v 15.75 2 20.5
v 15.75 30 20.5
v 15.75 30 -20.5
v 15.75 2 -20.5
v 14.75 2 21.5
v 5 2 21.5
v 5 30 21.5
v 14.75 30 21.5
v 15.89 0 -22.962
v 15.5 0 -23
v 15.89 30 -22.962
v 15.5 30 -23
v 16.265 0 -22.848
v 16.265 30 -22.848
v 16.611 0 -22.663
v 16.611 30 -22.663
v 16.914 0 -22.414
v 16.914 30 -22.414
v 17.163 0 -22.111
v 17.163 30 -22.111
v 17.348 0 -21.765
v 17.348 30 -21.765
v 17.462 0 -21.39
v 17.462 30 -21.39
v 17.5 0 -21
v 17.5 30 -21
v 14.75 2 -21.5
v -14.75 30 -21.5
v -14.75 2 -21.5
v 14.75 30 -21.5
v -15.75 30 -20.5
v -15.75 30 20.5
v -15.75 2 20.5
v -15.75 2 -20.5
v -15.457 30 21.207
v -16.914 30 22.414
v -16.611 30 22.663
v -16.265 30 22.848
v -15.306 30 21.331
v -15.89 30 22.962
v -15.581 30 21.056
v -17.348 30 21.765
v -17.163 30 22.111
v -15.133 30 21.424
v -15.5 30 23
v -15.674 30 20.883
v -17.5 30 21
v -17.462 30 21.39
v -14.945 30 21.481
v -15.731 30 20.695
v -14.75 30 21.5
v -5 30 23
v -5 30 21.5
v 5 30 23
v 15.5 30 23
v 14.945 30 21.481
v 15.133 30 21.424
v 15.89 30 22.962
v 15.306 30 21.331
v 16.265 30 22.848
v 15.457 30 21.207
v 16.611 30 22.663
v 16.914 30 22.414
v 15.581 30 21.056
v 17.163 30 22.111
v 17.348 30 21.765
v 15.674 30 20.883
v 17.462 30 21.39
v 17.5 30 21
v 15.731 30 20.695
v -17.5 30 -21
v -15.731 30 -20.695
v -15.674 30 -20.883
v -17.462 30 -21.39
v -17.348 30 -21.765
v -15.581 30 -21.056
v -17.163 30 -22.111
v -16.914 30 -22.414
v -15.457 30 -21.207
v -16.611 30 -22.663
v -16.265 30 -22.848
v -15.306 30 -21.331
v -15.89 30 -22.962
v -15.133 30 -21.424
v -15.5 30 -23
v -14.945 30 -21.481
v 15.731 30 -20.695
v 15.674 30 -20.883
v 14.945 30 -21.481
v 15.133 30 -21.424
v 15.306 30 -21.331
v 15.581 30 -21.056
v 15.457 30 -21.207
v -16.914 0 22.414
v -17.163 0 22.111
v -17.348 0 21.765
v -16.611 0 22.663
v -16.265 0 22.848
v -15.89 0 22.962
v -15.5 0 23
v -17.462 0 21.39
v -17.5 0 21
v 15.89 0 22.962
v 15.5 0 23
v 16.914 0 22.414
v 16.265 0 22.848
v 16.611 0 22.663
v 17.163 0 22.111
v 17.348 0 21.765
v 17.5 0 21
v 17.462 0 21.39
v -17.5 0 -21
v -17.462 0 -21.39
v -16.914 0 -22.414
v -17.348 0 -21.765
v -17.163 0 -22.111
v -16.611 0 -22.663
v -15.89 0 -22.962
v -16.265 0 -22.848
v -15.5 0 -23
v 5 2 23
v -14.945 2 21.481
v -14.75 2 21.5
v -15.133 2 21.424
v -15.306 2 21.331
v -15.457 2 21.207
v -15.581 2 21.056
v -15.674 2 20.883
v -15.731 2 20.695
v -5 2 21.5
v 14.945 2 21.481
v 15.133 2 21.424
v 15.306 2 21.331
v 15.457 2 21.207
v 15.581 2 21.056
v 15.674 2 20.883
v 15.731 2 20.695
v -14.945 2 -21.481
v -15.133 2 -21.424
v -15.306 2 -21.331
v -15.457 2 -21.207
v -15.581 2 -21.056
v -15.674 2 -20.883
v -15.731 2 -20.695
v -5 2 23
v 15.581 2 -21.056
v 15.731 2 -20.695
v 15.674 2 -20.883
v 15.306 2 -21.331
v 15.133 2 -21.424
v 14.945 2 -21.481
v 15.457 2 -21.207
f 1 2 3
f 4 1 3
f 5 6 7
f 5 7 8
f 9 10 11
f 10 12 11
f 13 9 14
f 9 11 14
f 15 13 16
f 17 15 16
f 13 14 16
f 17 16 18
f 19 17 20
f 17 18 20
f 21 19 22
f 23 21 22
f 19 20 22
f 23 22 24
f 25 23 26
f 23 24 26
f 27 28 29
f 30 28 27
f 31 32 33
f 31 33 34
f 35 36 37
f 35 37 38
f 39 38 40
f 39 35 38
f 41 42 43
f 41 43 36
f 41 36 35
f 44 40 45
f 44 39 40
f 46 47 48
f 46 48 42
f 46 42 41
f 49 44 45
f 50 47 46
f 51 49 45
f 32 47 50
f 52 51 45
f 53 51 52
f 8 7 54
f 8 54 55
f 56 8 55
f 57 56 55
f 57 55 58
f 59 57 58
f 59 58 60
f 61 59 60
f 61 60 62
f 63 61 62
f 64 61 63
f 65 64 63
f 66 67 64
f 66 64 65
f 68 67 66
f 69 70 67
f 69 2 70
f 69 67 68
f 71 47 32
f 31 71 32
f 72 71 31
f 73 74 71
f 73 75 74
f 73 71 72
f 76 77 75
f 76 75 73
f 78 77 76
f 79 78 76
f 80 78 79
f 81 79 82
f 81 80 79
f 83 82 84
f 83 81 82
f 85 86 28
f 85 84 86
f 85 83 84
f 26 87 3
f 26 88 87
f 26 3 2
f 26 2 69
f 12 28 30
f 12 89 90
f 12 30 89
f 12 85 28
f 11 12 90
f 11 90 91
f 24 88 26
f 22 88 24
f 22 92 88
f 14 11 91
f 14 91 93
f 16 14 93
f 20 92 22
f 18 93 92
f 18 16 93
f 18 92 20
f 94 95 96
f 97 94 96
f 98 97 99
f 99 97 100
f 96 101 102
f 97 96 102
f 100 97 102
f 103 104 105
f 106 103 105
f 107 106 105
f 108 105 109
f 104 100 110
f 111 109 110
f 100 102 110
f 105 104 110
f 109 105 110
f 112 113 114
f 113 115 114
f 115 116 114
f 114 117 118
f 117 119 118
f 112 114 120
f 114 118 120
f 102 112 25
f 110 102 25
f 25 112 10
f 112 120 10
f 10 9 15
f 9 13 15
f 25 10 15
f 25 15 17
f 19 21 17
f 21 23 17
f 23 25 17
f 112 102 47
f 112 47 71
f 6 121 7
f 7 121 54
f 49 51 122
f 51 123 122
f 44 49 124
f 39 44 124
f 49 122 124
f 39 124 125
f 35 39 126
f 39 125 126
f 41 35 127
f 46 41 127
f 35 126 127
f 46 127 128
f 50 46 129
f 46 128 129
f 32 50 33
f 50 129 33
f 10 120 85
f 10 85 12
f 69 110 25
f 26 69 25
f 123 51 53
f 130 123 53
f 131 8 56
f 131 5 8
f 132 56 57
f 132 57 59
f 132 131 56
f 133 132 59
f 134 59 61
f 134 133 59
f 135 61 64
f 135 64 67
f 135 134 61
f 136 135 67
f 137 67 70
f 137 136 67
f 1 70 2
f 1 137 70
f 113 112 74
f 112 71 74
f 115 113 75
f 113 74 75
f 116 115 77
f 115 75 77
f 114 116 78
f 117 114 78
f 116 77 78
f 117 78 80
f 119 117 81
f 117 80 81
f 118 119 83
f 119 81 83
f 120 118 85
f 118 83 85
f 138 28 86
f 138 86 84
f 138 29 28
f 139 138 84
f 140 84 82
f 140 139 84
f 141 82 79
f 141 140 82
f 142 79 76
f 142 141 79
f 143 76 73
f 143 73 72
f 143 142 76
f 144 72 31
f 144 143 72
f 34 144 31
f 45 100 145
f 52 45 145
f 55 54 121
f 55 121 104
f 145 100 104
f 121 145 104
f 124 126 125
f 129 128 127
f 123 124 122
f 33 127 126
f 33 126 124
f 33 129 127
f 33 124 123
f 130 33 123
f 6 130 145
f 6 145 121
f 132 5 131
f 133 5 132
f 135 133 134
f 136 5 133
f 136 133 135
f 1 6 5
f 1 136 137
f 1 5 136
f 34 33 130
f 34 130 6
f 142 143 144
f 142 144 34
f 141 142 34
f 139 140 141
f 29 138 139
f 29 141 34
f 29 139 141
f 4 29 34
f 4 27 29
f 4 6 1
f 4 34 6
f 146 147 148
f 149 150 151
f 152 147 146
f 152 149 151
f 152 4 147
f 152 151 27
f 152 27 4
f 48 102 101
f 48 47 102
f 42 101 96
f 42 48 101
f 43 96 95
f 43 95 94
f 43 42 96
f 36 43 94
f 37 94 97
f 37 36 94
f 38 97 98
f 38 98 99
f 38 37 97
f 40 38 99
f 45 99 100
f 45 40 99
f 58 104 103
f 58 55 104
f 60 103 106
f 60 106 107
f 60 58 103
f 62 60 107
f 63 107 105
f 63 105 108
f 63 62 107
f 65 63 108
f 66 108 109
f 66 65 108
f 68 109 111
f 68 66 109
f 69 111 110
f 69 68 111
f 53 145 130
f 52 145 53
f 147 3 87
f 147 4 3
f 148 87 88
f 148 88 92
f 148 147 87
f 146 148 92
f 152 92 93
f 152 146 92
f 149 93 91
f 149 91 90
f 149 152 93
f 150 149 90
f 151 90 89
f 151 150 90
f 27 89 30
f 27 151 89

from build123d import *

# Parameters (mm, degrees)
SKETCH1_W           = 35
SKETCH1_H           = 46
BOSS_EXTRUDE1_DEPTH = 30
SKETCH2_W           = 31.5
SKETCH2_H           = 43
CUT_EXTRUDE1_DEPTH  = 28
FILLET1_R           = 2
FILLET2_R           = 1
SKETCH3_W           = 10
SKETCH3_H           = 28
CUT_EXTRUDE2_DEPTH  = 8


with BuildPart() as part:
    # Sketch1 → Boss-Extrude1 (new body)
    with BuildSketch(Plane(origin=(0, 0, 0), x_dir=(1, 0, 0), z_dir=(0, 1, 0))):
        Rectangle(SKETCH1_W, SKETCH1_H)
    extrude(amount=BOSS_EXTRUDE1_DEPTH)

    # Sketch2 → Cut-Extrude1 (cut)
    with BuildSketch(Plane(origin=(0, 30, 0), x_dir=(1, 0, 0), z_dir=(0, 1, 0))):
        Rectangle(SKETCH2_W, SKETCH2_H)
    extrude(amount=-CUT_EXTRUDE1_DEPTH, mode=Mode.SUBTRACT)

    # Fillet1
    fillet1_edges = [part.edges().sort_by_distance(p)[0] for p in [
        (17.5, 15, 23),
        (-17.5, 15, 23),
        (-17.5, 15, -23),
        (17.5, 15, -23),
    ]]
    fillet(fillet1_edges, radius=FILLET1_R)

    # Fillet2
    fillet2_edges = [part.edges().sort_by_distance(p)[0] for p in [
        (15.75, 16, -21.5),
        (15.75, 16, 21.5),
        (-15.75, 16, 21.5),
        (-15.75, 16, -21.5),
    ]]
    fillet(fillet2_edges, radius=FILLET2_R)

    # Sketch3 → Cut-Extrude2 (cut)
    with BuildSketch(Plane.XY.offset(23)):
        with Locations((0, 16)):
            Rectangle(SKETCH3_W, SKETCH3_H)
    extrude(amount=-CUT_EXTRUDE2_DEPTH, mode=Mode.SUBTRACT)


solid = part.part
